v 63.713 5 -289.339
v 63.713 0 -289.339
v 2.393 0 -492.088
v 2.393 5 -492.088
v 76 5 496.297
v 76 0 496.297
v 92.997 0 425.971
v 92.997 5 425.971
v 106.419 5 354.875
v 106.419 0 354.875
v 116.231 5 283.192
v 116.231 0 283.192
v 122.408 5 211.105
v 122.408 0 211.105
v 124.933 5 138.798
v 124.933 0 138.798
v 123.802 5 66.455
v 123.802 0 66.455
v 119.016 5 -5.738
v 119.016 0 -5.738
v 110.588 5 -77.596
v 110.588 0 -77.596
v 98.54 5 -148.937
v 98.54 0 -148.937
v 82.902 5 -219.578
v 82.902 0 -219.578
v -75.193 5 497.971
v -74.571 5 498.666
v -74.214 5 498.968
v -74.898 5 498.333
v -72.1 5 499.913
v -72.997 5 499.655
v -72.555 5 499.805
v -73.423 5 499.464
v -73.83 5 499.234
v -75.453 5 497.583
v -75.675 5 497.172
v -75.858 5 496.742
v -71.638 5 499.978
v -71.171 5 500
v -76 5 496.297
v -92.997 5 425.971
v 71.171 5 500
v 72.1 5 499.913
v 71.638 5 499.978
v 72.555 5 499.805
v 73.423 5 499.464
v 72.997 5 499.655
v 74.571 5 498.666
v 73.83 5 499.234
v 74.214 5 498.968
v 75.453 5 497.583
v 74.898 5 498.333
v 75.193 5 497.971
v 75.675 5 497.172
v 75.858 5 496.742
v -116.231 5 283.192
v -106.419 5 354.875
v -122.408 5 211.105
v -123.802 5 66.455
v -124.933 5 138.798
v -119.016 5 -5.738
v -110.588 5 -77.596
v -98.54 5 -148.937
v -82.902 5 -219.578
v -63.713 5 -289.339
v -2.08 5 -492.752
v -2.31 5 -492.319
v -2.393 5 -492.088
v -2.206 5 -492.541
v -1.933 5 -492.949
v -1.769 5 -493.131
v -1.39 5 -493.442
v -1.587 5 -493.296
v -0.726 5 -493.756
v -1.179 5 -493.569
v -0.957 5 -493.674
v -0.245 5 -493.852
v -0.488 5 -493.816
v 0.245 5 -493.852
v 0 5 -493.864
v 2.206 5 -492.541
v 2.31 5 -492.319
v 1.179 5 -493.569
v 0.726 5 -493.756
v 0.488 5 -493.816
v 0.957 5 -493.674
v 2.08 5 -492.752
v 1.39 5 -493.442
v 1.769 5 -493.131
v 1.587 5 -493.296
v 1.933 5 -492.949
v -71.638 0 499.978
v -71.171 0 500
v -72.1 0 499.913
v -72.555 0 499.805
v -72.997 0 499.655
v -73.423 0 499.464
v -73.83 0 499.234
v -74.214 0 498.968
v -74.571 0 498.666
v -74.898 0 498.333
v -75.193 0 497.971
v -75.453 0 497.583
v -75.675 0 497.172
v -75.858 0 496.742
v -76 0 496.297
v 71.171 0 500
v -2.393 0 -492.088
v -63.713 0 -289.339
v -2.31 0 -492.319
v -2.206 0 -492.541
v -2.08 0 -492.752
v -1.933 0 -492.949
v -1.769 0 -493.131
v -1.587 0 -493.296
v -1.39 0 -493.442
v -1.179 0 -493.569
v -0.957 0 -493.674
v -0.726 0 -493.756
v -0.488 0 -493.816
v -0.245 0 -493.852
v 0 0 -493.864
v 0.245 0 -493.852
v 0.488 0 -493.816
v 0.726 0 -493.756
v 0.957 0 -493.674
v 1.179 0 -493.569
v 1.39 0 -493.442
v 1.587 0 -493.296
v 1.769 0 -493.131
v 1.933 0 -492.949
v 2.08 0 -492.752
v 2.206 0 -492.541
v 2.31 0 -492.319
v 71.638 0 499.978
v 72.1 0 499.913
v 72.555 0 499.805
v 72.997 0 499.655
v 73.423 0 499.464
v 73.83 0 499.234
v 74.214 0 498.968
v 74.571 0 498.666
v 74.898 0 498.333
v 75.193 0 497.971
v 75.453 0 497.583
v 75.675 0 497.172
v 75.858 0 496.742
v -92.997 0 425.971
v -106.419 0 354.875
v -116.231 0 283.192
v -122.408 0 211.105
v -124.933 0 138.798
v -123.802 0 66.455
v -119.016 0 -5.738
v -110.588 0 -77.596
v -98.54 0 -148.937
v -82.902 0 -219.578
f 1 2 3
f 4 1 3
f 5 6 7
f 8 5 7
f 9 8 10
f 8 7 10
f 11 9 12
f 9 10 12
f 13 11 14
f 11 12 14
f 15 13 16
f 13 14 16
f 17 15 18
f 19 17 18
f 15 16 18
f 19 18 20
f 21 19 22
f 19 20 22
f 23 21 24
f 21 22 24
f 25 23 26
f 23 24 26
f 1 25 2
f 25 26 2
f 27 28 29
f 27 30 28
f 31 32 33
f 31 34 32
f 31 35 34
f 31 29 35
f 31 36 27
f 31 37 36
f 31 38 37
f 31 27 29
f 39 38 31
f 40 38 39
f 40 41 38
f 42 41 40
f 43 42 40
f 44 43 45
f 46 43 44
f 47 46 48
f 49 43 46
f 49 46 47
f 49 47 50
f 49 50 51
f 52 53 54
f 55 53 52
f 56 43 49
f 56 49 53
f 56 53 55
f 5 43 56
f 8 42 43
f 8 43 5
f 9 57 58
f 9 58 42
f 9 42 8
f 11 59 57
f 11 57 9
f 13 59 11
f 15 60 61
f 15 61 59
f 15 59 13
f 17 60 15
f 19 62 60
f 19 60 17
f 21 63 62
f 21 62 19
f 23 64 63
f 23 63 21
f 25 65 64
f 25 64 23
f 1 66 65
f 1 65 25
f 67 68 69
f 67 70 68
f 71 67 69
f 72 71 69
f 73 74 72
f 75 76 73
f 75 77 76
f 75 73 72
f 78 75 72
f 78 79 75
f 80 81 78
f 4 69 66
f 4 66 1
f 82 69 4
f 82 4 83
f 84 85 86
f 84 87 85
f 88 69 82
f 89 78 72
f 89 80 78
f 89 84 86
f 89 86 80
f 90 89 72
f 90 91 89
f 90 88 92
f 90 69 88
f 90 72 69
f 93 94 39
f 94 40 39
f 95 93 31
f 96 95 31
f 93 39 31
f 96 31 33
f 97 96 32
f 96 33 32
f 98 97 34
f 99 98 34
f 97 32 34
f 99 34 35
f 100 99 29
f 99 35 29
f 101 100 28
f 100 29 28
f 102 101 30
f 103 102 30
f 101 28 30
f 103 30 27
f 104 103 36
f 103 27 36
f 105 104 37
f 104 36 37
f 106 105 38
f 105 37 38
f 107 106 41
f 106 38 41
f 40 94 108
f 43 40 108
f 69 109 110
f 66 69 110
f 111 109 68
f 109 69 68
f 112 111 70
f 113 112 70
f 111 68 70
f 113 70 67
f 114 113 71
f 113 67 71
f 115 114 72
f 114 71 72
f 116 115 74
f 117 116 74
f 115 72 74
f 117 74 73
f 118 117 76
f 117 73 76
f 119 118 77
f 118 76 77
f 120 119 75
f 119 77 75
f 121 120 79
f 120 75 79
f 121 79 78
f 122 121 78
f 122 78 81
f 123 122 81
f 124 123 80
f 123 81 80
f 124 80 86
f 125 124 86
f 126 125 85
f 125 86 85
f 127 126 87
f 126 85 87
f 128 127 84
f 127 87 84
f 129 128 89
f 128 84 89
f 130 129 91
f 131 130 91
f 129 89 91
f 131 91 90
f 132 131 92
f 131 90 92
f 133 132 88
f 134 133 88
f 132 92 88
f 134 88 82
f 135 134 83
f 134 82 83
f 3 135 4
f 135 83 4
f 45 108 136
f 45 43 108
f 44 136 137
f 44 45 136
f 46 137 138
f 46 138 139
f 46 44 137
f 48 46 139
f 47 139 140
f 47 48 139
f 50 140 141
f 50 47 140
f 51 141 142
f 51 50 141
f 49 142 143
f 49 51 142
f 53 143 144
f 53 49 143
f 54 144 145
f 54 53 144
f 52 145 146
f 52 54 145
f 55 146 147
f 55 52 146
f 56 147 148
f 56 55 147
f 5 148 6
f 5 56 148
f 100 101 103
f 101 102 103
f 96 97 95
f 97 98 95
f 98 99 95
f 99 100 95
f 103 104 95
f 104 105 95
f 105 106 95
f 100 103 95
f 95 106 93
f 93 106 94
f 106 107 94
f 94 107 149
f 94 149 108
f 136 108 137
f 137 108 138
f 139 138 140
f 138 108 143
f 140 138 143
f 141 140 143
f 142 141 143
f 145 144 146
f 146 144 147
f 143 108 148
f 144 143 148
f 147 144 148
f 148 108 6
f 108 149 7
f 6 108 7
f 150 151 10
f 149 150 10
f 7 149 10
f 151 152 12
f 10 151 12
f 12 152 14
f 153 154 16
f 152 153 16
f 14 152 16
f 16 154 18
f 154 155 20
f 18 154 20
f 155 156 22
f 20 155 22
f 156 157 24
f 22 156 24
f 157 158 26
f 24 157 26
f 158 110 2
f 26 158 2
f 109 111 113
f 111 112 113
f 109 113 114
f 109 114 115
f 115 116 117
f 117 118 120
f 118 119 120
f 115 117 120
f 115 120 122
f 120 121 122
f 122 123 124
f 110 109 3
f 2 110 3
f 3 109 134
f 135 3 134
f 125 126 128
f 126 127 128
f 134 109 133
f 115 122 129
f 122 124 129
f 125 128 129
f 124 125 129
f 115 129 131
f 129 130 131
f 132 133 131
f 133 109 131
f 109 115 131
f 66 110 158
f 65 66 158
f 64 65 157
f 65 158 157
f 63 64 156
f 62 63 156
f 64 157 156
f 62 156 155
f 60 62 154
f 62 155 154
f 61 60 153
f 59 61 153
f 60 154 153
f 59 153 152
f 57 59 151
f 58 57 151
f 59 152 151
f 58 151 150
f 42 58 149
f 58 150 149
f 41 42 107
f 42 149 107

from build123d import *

# Parameters (mm, degrees)
BOSS_EXTRUDE1_DEPTH = 5
FILLET1_R           = 5
FILLET2_R           = 2.5


with BuildPart() as part:
    # Sketch1 → Boss-Extrude1 (new body)
    with BuildSketch(Plane(origin=(0, 0, 0), x_dir=(1, 0, 0), z_dir=(0, 1, 0))):
        with BuildLine():
            Line((-75, -500), (75, -500))
            ThreePointArc((75, -500), (124.853709924, -104.537010412), (63.713442869, 289.338904404))
            Line((63.713442869, 289.338904404), (0, 500))
            Line((0, 500), (-63.713442869, 289.338904404))
            ThreePointArc((-63.713442869, 289.338904404), (-124.853709924, -104.537010412), (-75, -500))
        make_face()
    extrude(amount=BOSS_EXTRUDE1_DEPTH)

    # Fillet1
    fillet1_edges = [part.edges().sort_by_distance(p)[0] for p in [
        (75, 2.5, 500),
        (-75, 2.5, 500),
    ]]
    fillet(fillet1_edges, radius=FILLET1_R)

    # Fillet2
    fillet2_edges = [part.edges().sort_by_distance(p)[0] for p in [
        (0, 2.5, -500),
    ]]
    fillet(fillet2_edges, radius=FILLET2_R)


solid = part.part
